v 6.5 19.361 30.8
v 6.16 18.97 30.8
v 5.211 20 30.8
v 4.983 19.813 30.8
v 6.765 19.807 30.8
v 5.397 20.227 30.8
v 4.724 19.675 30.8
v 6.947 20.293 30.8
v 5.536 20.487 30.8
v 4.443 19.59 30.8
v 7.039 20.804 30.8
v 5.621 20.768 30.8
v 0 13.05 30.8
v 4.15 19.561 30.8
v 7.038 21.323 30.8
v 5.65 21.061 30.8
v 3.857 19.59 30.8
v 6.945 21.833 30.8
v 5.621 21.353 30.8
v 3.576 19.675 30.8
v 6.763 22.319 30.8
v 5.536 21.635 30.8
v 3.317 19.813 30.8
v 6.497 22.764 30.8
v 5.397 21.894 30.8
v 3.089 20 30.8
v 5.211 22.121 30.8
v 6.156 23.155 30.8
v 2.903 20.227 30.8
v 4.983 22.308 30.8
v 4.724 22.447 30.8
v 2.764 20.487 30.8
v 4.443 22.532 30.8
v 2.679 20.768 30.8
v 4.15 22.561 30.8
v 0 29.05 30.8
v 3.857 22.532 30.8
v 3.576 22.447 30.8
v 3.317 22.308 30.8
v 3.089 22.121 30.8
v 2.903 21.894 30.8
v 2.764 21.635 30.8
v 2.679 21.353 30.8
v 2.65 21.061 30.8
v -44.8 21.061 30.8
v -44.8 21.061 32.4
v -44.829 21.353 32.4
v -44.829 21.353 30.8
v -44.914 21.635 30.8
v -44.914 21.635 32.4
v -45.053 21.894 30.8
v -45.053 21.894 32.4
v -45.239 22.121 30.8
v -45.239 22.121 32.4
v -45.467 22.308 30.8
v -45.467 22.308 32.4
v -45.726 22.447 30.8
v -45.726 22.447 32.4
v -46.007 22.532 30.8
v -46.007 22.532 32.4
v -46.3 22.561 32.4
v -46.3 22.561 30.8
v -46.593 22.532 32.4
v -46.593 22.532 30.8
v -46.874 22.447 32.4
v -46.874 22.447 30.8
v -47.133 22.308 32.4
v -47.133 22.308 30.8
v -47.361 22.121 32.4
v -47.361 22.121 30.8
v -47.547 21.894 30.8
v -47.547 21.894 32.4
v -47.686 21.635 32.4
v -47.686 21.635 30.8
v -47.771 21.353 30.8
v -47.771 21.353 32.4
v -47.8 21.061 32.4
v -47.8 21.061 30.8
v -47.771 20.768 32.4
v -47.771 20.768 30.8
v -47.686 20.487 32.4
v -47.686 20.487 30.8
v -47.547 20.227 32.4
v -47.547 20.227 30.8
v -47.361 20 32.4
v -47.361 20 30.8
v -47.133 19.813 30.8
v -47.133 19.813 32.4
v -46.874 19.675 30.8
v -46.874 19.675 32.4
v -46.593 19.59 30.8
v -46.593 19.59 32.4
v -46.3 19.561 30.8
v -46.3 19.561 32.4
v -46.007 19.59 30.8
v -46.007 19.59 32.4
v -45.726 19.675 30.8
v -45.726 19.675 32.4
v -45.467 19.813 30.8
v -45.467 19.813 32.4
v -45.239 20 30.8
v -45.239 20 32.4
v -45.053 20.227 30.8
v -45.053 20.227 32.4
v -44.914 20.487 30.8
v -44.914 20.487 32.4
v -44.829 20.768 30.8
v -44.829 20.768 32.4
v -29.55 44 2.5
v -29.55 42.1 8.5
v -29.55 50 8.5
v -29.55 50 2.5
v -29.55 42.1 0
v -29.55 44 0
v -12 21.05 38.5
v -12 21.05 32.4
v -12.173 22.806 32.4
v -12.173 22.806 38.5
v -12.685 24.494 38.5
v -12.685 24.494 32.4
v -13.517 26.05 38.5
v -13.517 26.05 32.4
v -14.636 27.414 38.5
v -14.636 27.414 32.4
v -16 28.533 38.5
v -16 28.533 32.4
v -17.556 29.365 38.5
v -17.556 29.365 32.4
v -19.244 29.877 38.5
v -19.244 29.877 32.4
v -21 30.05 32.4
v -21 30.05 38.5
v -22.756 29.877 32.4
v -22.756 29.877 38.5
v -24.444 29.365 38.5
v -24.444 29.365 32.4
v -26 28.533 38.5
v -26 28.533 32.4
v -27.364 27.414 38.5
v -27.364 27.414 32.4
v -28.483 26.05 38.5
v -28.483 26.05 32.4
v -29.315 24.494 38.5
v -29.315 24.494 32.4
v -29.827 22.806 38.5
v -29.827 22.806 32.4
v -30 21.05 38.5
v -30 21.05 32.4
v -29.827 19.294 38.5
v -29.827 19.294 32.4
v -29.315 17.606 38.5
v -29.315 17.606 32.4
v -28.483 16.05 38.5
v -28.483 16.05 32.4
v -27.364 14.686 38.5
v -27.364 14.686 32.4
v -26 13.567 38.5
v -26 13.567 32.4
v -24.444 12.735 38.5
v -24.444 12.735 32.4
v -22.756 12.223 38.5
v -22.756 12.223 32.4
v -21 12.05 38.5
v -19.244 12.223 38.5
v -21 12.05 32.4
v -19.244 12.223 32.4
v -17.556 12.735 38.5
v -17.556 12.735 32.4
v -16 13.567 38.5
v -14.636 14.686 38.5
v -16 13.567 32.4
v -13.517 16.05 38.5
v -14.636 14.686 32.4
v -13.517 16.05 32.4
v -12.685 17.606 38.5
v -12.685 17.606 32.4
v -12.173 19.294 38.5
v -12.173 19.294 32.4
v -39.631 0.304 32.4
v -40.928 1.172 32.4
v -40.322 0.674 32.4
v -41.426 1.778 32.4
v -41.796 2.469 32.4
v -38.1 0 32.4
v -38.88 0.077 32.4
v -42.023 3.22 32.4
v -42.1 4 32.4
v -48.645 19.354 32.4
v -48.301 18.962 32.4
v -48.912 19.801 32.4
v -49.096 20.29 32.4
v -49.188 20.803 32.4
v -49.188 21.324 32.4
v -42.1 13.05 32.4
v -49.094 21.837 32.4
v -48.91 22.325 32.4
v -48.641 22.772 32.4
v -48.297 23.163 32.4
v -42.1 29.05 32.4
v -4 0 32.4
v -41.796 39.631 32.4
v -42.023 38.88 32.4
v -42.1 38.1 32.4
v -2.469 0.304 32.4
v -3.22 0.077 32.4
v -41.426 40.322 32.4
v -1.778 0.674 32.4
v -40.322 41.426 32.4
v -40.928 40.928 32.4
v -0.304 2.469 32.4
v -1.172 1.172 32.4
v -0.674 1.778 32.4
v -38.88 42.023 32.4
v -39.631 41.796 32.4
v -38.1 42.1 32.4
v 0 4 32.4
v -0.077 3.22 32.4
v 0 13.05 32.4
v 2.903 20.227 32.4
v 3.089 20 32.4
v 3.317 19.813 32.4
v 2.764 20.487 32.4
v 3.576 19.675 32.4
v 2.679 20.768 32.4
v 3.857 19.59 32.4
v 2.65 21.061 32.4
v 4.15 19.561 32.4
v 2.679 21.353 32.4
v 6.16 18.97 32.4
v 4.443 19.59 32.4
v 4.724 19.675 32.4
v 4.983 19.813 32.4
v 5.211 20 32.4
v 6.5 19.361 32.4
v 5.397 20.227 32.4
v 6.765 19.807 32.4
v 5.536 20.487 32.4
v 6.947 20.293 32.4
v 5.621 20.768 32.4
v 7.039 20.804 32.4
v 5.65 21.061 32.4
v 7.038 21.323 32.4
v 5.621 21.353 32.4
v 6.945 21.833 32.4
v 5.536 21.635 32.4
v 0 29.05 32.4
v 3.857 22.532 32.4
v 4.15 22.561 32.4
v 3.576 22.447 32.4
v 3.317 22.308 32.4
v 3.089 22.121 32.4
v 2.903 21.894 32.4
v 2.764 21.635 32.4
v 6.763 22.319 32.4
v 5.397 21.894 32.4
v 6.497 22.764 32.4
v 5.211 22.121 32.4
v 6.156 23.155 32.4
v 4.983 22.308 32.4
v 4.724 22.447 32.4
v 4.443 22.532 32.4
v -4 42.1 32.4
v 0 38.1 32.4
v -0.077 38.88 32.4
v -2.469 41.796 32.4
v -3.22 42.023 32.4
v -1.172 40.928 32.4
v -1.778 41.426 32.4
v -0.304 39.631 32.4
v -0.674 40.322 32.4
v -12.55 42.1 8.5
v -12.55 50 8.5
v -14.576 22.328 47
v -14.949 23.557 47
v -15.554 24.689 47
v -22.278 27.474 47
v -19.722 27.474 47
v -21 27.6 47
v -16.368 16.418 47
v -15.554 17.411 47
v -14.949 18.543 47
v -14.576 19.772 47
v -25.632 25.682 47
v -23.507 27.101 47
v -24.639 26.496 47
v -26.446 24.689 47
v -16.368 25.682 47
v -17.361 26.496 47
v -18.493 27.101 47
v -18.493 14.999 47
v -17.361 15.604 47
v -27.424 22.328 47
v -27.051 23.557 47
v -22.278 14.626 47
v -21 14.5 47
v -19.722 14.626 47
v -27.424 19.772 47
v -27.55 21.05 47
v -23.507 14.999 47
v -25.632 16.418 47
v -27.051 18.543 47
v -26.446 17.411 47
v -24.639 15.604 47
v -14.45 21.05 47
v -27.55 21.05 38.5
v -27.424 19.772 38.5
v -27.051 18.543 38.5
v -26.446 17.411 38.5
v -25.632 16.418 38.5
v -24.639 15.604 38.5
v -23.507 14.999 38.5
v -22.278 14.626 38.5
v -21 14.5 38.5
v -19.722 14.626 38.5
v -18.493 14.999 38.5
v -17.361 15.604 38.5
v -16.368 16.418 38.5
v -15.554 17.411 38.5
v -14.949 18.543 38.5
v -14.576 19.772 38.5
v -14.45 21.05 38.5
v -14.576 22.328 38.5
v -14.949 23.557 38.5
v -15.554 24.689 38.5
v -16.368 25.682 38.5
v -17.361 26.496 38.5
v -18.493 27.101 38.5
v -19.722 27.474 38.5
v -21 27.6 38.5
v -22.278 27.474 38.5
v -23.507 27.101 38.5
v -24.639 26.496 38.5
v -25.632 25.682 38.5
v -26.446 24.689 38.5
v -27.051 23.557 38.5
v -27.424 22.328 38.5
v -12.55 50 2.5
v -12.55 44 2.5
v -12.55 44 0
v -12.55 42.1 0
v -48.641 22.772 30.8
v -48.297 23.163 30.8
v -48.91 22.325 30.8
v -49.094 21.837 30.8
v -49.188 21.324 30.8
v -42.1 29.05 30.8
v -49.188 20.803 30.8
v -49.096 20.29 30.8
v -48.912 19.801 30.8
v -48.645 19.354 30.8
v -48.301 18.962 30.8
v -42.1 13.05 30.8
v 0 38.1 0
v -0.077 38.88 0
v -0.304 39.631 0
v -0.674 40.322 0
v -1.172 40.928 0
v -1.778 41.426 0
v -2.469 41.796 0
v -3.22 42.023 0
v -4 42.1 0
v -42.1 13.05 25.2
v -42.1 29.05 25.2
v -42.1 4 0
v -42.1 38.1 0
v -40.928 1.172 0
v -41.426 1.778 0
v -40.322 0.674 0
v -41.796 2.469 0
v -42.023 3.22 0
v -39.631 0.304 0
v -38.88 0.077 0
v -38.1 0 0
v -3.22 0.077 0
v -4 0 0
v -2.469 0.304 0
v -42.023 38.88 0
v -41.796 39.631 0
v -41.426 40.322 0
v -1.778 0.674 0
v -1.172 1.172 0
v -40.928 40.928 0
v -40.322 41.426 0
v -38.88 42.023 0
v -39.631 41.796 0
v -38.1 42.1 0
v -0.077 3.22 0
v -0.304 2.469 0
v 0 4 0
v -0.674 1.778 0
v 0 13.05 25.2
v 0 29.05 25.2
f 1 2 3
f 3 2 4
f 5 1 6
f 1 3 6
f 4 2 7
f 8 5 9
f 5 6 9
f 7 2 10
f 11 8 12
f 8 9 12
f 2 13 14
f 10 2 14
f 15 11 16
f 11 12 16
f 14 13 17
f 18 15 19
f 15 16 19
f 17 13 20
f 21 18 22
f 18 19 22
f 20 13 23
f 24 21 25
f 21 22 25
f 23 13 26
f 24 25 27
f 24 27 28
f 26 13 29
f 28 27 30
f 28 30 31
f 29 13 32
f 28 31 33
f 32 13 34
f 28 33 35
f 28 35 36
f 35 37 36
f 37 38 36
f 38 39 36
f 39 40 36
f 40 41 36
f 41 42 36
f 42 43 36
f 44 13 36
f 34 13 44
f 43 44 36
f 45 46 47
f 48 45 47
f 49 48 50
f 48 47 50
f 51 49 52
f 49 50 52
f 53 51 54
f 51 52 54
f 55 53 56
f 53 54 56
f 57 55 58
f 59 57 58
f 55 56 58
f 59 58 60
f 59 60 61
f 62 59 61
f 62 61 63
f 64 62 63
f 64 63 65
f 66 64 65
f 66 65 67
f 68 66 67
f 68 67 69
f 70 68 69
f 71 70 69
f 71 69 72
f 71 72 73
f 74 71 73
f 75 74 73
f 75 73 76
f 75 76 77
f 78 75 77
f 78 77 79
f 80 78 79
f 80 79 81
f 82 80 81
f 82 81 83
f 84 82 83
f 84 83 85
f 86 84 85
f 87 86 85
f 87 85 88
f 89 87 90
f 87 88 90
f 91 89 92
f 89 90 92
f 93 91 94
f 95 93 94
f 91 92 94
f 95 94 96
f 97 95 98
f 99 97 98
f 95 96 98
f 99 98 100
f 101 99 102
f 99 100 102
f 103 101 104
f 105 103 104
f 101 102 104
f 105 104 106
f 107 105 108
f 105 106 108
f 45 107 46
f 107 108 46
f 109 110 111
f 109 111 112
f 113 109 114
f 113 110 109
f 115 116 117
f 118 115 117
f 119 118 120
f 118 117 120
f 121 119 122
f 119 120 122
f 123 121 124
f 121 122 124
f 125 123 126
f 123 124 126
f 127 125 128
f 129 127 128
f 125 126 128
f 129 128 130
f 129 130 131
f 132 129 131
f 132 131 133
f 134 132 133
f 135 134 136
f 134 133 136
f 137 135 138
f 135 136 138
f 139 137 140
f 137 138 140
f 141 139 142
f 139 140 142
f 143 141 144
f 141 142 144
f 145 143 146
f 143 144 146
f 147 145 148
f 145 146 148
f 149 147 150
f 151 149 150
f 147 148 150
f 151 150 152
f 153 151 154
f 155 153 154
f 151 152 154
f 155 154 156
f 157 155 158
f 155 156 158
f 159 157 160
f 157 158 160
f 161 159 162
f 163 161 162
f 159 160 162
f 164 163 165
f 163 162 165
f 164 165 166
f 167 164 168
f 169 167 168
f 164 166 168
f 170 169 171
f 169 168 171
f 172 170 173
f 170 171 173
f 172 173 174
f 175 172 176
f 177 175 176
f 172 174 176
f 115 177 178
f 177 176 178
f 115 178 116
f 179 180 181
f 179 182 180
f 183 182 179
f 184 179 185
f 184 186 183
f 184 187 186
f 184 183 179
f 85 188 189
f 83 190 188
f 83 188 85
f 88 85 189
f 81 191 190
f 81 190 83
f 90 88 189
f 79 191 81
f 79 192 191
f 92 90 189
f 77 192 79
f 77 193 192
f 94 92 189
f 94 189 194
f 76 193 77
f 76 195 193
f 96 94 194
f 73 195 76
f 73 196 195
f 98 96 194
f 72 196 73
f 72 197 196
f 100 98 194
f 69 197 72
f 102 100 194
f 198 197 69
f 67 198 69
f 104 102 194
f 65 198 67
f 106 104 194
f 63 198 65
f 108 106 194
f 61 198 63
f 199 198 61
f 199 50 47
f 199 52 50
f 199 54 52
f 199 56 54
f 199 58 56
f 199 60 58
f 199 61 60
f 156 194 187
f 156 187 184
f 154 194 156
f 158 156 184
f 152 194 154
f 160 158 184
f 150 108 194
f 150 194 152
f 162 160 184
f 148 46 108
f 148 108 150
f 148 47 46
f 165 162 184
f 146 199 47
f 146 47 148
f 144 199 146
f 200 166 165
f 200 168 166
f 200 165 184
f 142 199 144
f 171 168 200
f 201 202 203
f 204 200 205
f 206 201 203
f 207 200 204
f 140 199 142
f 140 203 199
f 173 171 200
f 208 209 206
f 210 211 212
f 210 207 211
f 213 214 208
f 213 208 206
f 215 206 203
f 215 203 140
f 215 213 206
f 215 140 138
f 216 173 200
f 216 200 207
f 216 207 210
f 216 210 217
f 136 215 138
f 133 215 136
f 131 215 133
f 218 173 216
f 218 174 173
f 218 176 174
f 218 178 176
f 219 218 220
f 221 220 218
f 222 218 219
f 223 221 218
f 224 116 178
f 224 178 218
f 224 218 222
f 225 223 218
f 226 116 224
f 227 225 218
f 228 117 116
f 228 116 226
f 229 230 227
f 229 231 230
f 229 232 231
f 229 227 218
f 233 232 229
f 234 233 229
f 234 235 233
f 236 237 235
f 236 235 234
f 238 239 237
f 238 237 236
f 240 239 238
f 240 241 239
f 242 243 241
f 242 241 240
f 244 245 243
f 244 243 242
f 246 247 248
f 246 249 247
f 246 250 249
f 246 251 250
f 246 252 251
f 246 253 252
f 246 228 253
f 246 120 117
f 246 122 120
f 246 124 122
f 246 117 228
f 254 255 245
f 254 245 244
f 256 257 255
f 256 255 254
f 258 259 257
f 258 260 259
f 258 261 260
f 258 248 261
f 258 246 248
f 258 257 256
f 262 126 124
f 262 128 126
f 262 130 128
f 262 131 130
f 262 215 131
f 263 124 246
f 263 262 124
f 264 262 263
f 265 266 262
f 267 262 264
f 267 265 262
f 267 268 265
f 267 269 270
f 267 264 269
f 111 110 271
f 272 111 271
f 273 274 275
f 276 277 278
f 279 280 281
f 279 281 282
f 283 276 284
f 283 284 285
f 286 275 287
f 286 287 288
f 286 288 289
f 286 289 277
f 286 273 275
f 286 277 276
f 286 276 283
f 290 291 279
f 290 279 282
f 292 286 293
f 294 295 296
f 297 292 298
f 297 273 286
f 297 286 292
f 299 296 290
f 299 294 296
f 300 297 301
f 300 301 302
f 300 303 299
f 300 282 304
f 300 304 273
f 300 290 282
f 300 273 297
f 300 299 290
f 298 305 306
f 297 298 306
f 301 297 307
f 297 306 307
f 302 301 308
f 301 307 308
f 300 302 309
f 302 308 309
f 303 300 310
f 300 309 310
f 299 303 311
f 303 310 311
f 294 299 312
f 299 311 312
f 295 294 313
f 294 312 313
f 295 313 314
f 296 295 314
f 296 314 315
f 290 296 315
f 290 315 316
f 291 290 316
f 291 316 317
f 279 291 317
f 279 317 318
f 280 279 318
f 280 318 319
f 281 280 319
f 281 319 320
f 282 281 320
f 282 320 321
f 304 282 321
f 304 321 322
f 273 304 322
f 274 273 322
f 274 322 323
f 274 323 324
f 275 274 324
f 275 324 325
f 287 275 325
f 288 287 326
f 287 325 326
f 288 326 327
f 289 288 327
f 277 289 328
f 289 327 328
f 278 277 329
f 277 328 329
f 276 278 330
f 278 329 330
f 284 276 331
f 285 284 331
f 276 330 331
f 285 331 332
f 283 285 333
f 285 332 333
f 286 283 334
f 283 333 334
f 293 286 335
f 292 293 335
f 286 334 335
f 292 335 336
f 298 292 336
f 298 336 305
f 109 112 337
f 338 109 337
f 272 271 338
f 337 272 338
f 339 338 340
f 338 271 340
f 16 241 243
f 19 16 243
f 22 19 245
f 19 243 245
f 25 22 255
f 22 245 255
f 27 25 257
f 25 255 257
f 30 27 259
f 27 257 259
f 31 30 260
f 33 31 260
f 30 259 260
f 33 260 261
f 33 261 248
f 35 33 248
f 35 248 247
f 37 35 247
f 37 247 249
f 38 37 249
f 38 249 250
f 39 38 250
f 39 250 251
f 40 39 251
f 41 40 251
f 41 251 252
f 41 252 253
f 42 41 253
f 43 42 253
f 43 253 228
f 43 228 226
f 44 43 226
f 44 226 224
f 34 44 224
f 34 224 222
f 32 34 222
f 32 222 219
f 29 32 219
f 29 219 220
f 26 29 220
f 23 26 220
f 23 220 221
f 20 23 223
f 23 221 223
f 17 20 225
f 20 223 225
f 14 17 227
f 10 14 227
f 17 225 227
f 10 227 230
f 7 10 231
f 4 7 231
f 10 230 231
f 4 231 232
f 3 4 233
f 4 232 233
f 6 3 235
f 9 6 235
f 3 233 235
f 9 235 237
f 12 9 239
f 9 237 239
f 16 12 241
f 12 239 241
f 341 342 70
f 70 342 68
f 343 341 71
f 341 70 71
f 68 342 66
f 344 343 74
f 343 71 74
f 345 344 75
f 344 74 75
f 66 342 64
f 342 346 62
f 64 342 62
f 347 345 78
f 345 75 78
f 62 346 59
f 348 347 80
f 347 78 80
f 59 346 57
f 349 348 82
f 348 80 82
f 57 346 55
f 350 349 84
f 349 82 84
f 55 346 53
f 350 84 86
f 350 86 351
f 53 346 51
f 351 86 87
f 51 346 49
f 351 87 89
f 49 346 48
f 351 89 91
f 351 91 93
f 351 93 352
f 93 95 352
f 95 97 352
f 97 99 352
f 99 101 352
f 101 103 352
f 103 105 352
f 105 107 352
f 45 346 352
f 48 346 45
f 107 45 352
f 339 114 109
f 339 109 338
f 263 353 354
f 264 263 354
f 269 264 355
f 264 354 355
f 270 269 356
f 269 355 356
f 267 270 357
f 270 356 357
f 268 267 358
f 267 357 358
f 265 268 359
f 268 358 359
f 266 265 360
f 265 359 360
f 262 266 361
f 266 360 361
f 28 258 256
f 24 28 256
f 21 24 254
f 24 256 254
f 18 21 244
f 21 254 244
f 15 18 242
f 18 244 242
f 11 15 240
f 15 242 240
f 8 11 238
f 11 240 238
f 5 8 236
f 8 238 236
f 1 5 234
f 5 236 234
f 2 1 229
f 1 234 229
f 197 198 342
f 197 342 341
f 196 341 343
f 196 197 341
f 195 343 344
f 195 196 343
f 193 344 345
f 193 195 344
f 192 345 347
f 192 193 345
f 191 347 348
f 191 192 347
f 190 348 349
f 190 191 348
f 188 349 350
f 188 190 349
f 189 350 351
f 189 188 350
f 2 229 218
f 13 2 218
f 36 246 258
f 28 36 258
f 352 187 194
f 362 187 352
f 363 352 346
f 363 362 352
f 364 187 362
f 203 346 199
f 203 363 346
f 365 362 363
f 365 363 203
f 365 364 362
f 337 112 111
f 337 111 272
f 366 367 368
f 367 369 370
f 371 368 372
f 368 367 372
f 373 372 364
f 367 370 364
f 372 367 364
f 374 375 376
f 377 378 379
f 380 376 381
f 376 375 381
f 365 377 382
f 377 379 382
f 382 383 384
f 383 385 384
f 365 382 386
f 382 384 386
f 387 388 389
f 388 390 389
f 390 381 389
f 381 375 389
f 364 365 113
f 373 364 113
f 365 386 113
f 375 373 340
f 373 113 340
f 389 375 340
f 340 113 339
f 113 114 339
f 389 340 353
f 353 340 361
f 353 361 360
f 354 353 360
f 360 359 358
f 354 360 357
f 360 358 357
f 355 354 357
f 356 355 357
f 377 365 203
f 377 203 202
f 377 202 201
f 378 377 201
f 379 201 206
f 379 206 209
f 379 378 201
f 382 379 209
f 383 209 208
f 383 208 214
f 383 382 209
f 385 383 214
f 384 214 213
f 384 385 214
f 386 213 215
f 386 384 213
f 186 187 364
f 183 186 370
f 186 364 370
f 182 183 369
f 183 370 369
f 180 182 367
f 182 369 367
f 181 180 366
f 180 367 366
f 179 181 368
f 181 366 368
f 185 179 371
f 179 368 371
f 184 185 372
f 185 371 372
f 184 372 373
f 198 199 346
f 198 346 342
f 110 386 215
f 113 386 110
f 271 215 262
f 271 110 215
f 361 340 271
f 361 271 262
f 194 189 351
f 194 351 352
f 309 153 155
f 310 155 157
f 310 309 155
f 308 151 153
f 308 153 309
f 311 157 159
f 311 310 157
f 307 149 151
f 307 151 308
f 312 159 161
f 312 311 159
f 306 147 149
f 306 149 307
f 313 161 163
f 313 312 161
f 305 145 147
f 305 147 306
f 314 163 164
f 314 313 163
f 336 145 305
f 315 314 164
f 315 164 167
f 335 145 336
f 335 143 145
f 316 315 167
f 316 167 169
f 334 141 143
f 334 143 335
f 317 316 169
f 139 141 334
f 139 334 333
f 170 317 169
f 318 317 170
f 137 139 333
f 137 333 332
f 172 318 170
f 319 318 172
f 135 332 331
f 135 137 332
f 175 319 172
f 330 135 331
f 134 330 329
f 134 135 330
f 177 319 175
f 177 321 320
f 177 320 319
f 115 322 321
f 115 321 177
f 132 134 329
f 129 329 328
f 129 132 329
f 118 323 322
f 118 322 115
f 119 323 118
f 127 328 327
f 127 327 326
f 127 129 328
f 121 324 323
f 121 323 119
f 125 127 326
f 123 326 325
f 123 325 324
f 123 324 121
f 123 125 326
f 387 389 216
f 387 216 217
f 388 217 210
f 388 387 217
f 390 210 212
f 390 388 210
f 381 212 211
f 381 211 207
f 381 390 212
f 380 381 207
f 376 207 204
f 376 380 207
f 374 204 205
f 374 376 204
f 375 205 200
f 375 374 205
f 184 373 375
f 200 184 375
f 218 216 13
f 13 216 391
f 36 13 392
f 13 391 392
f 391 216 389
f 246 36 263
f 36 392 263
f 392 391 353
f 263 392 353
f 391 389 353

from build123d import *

# Parameters (mm, degrees)
SKETCH1_W           = 42.1
SKETCH1_H           = 42.1
BOSS_EXTRUDE1_DEPTH = 32.4
SKETCH2_W           = 17
SKETCH2_H           = 8.5
BOSS_EXTRUDE2_DEPTH = 7.9
BOSS_EXTRUDE3_DEPTH = 7.15
BOSS_EXTRUDE4_DEPTH = 7.2
SKETCH6_R           = 1.5
CUT_EXTRUDE1_DEPTH  = 7.2
CUT_EXTRUDE2_DEPTH  = 7.2
SKETCH9_R           = 6.55
BOSS_EXTRUDE5_DEPTH = 14.6
SKETCH11_R          = 9
BOSS_EXTRUDE6_DEPTH = 6.1
SKETCH12_W          = 17
SKETCH12_H          = 2.5
CUT_EXTRUDE3_DEPTH  = 6
CUT_EXTRUDE4_DEPTH  = 40


with BuildPart() as part:
    # Sketch1 → Boss-Extrude1 (new body)
    with BuildSketch(Plane.XY):
        with Locations((-21.05, 21.05)):
            Rectangle(SKETCH1_W, SKETCH1_H)
    extrude(amount=BOSS_EXTRUDE1_DEPTH)

    # Sketch2 → Boss-Extrude2 (add)
    with BuildSketch(Plane(origin=(0, 42.1, 0), x_dir=(1, 0, 0), z_dir=(0, 1, 0))):
        with Locations((-21.05, -4.25)):
            Rectangle(SKETCH2_W, SKETCH2_H)
    extrude(amount=BOSS_EXTRUDE2_DEPTH)

    # Sketch3 → Boss-Extrude3 (add)
    with BuildSketch(Plane(origin=(0, 0, 0), x_dir=(0, 0, -1), z_dir=(1, 0, 0))):
        Polygon((-32.4, 21.05), (-32.4, 29.05), (-30.8, 29.05), (-30.8, 21.05), (-30.8, 13.05), (-32.4, 13.05), align=None)
    extrude(amount=BOSS_EXTRUDE3_DEPTH)

    # Sketch4 → Boss-Extrude4 (add)
    with BuildSketch(Plane.ZY.offset(42.1)):
        Polygon((32.4, 21.05), (32.4, 29.05), (30.8, 29.05), (30.8, 21.05), (30.8, 13.05), (32.4, 13.05), align=None)
    extrude(amount=BOSS_EXTRUDE4_DEPTH)

    # Sketch6 → Cut-Extrude1 (cut)
    with BuildSketch(Plane.XY.offset(32.4)):
        with Locations((-46.3, 21.060702299)):
            Circle(SKETCH6_R)
        with Locations((4.15, 21.060702299)):
            Circle(SKETCH6_R)
    extrude(amount=-CUT_EXTRUDE1_DEPTH, mode=Mode.SUBTRACT)

    # Sketch7 → Cut-Extrude2 (cut)
    with BuildSketch(Plane.XY.offset(32.4)):
        with BuildLine():
            Line((-42.1, 29.05), (-48.297247635, 23.163320163))
            ThreePointArc((-48.297247635, 23.163320163), (-49.19999881, 21.063329654), (-48.301054234, 18.961706835))
            Line((-48.301054234, 18.961706835), (-42.1, 13.05))
            Line((-42.1, 13.05), (-49.3, 13.05))
            Line((-49.3, 13.05), (-49.3, 29.05))
            Line((-49.3, 29.05), (-42.1, 29.05))
        make_face()
        with BuildLine():
            Line((0, 29.05), (6.155732332, 23.155227976))
            ThreePointArc((6.155732332, 23.155227976), (7.049998812, 21.063327019), (6.159520454, 18.969810731))
            Line((6.159520454, 18.969810731), (0, 13.05))
            Line((0, 13.05), (7.15, 13.05))
            Line((7.15, 13.05), (7.15, 29.05))
            Line((7.15, 29.05), (0, 29.05))
        make_face()
    extrude(amount=-CUT_EXTRUDE2_DEPTH, mode=Mode.SUBTRACT)

    # Sketch9 → Boss-Extrude5 (add)
    with BuildSketch(Plane.XY.offset(32.4)):
        with Locations(Location((-21, 21.05, 0), (0, 0, 180))):
            Circle(SKETCH9_R)
    extrude(amount=BOSS_EXTRUDE5_DEPTH)

    # Sketch11 → Boss-Extrude6 (add)
    with BuildSketch(Plane.XY.offset(32.4)):
        with Locations((-21, 21.05)):
            Circle(SKETCH11_R)
    extrude(amount=BOSS_EXTRUDE6_DEPTH)

    # Sketch12 → Cut-Extrude3 (cut)
    with BuildSketch(Plane(origin=(0, 50, 0), x_dir=(1, 0, 0), z_dir=(0, 1, 0))):
        with Locations((-21.05, -1.25)):
            Rectangle(SKETCH12_W, SKETCH12_H)
    extrude(amount=-CUT_EXTRUDE3_DEPTH, mode=Mode.SUBTRACT)

    # Sketch13 → Cut-Extrude4 (cut)
    with BuildSketch(Plane(origin=(0, 0, 0), x_dir=(-1, 0, 0), z_dir=(0, 0, -1))):
        with BuildLine():
            Line((0, 0), (0, 4))
            ThreePointArc((0, 4), (1.171572875, 1.171572875), (4, 0))
            Line((4, 0), (0, 0))
        make_face()
        with BuildLine():
            Line((38.1, 0), (42.1, 0))
            Line((42.1, 0), (42.1, 4))
            ThreePointArc((42.1, 4), (40.928427125, 1.171572875), (38.1, 0))
        make_face()
        with BuildLine():
            Line((38.1, 42.1), (42.1, 42.1))
            Line((42.1, 42.1), (42.1, 38.1))
            ThreePointArc((42.1, 38.1), (40.928427125, 40.928427125), (38.1, 42.1))
        make_face()
        with BuildLine():
            Line((4, 42.1), (0, 42.1))
            Line((0, 42.1), (0, 38.1))
            ThreePointArc((0, 38.1), (1.171572875, 40.928427125), (4, 42.1))
        make_face()
    extrude(amount=-CUT_EXTRUDE4_DEPTH, mode=Mode.SUBTRACT)


solid = part.part
